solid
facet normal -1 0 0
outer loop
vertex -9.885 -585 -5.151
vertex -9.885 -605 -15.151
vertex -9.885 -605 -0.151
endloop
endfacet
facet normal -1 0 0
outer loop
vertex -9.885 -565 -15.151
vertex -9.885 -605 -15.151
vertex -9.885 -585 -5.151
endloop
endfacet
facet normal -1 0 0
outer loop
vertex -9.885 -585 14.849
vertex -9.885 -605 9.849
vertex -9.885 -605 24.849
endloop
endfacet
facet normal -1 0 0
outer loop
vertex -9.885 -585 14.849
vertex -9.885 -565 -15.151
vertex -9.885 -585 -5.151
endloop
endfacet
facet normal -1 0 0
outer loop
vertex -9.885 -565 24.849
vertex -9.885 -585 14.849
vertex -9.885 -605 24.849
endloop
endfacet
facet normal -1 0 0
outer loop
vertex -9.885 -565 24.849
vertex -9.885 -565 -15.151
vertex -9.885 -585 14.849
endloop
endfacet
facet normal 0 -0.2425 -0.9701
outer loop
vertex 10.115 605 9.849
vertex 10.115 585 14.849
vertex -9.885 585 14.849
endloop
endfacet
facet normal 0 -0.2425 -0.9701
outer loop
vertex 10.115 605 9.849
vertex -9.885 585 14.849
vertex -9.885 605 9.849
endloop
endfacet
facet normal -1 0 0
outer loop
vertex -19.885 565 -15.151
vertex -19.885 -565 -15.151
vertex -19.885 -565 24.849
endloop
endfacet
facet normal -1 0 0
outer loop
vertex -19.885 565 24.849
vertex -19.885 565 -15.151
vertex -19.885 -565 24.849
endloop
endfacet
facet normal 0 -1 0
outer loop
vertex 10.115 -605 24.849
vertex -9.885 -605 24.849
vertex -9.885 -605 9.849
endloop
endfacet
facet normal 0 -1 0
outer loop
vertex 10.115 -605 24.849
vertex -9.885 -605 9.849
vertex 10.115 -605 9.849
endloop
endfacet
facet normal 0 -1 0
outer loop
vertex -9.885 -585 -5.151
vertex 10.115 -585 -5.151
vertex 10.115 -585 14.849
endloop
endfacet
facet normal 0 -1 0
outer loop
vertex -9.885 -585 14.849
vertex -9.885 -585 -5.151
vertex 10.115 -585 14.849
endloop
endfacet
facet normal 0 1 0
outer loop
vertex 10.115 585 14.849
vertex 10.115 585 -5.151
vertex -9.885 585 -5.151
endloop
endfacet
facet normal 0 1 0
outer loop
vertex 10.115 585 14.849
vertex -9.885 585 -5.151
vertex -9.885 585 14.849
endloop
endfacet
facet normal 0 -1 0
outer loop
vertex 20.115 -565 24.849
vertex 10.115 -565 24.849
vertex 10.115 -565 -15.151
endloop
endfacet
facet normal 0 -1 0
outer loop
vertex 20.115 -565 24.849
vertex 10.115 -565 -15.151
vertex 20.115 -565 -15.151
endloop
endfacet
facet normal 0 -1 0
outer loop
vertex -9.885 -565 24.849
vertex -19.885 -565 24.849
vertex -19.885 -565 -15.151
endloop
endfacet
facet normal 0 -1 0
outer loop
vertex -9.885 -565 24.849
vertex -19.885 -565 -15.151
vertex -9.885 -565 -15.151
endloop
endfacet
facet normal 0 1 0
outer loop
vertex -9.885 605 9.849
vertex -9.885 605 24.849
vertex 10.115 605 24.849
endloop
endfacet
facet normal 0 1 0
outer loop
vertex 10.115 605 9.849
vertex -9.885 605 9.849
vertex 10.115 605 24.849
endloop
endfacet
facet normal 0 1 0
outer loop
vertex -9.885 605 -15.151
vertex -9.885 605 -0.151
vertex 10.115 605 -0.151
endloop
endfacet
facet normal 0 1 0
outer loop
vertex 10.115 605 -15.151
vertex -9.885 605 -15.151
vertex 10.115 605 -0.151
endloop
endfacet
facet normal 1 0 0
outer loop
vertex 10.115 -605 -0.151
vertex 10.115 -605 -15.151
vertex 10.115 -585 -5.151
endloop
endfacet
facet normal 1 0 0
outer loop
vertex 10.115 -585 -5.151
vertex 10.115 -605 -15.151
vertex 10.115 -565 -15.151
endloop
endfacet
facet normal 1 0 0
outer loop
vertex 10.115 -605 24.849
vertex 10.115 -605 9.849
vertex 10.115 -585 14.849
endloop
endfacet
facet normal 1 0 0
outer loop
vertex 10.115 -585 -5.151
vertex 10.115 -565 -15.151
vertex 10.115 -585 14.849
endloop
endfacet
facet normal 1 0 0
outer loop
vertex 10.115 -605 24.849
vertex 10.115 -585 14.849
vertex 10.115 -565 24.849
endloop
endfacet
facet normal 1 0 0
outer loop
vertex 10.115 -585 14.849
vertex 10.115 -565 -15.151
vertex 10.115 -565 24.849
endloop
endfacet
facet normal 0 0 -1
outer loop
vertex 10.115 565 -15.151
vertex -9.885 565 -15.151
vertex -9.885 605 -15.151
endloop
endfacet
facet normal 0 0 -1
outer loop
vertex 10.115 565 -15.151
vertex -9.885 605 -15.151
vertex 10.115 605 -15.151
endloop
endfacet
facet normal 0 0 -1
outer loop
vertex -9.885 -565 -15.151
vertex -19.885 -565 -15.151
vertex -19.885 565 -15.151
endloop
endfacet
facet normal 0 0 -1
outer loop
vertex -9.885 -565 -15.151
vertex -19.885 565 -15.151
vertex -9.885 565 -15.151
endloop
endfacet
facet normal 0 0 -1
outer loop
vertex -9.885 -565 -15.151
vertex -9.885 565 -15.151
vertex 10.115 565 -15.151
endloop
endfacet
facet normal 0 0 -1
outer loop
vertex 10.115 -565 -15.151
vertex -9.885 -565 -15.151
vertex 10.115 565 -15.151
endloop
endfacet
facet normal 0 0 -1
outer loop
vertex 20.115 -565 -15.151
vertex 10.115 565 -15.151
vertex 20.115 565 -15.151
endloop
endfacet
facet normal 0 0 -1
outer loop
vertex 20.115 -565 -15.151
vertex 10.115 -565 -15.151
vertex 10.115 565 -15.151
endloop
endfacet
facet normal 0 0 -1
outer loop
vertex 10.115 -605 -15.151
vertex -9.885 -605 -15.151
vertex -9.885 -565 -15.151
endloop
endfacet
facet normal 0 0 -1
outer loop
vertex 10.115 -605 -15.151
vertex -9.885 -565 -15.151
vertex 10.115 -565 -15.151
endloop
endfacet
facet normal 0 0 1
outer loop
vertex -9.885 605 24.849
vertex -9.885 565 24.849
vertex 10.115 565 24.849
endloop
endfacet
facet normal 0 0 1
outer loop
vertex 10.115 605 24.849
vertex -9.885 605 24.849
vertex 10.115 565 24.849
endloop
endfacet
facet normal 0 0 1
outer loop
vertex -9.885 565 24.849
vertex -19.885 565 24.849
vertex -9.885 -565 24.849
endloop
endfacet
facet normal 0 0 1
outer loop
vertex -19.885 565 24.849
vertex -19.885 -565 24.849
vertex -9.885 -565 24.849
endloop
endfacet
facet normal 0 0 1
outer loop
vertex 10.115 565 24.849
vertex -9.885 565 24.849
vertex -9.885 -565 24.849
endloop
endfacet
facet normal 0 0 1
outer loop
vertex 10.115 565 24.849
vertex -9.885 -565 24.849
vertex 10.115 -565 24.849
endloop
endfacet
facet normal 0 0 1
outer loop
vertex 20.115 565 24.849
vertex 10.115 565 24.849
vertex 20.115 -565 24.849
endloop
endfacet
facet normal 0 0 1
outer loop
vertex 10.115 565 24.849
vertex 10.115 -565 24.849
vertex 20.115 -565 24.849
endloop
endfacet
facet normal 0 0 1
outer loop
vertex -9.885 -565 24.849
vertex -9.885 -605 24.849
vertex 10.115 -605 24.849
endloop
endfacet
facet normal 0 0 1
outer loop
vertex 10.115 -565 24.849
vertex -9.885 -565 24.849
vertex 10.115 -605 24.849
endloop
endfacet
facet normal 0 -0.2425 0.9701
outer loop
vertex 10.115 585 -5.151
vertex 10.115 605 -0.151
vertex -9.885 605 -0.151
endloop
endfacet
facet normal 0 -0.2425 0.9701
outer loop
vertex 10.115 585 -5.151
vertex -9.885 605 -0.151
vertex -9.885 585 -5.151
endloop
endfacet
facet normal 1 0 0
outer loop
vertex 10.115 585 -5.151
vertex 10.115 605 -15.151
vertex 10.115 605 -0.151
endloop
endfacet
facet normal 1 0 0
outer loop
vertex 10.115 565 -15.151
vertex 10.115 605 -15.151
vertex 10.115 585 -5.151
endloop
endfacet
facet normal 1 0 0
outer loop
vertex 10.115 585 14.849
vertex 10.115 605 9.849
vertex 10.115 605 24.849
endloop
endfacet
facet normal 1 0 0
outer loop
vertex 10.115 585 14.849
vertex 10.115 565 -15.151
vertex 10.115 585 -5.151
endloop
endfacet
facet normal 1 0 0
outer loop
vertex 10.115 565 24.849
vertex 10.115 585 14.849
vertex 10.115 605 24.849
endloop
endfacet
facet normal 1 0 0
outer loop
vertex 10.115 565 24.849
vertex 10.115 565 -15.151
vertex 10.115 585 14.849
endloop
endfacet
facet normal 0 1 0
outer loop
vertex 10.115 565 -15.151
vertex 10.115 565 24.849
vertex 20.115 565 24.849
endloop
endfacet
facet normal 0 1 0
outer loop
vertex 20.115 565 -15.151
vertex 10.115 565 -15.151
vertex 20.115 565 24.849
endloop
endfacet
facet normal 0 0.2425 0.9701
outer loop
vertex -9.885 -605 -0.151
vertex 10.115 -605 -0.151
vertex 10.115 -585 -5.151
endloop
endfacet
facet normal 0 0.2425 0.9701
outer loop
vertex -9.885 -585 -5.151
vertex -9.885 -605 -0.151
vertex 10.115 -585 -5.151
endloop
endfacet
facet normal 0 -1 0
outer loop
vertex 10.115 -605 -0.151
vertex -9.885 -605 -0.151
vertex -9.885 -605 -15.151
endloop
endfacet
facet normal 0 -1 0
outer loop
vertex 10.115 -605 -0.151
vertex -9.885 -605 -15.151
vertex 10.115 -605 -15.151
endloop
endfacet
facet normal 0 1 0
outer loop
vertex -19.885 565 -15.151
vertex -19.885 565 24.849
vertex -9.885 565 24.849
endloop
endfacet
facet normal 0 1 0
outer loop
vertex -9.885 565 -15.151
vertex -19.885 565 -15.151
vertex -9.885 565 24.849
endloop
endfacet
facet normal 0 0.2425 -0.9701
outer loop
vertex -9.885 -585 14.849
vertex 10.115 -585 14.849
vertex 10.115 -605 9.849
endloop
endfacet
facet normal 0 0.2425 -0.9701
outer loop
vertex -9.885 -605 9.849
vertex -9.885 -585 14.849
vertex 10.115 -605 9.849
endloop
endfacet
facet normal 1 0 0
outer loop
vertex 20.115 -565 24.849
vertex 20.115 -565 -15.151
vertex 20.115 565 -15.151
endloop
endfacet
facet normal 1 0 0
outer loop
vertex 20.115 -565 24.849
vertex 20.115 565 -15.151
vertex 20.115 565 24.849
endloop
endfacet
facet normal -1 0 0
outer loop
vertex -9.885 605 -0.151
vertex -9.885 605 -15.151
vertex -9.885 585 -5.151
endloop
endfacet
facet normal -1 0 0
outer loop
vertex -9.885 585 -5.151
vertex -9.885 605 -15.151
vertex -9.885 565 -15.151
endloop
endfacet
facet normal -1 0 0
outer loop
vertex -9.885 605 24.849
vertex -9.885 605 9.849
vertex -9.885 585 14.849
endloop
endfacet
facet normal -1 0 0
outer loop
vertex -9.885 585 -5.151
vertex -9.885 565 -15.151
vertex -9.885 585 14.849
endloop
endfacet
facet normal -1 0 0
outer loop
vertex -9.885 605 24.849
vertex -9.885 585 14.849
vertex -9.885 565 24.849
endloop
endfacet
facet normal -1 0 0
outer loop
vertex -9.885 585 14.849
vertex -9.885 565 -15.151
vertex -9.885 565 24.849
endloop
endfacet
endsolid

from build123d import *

# Parameters (mm, degrees)
F0_W     = 40
F0_H     = 40
F1_DEPTH = 565
F2_W     = 20
F2_H     = 40
F3_DEPTH = 40
F5_DEPTH = 20


with BuildPart() as f1:
    # F0 (on Front) → F1 (new body)
    with BuildSketch(Plane.XZ):
        with Locations((0.1153, 4.849257)):
            Rectangle(F0_W, F0_H)
    extrude(amount=F1_DEPTH)

    # F2 (on face) → F3 (join)
    with BuildSketch(Plane.XZ.offset(565)):
        with Locations((0.1153, 4.849257)):
            Rectangle(F2_W, F2_H)
    extrude(amount=F3_DEPTH)

    # F4 (on face) → F5 (cut)
    with BuildSketch(Plane.YZ.offset(10.1153)):
        Polygon((-585, 14.849257), (-605, 9.849257), (-605, -0.150743), (-585, -5.150743), align=None)
    extrude(amount=-F5_DEPTH, mode=Mode.SUBTRACT)

    # F6: F1 across face


with BuildPart() as f1_1:
    add(f1.part)
    add(f1.part.mirror(Plane(origin=(0.1153, 0, 4.849257), x_dir=(1, 0, 0), z_dir=(0, 1, 0))))


solid = f1_1.part
